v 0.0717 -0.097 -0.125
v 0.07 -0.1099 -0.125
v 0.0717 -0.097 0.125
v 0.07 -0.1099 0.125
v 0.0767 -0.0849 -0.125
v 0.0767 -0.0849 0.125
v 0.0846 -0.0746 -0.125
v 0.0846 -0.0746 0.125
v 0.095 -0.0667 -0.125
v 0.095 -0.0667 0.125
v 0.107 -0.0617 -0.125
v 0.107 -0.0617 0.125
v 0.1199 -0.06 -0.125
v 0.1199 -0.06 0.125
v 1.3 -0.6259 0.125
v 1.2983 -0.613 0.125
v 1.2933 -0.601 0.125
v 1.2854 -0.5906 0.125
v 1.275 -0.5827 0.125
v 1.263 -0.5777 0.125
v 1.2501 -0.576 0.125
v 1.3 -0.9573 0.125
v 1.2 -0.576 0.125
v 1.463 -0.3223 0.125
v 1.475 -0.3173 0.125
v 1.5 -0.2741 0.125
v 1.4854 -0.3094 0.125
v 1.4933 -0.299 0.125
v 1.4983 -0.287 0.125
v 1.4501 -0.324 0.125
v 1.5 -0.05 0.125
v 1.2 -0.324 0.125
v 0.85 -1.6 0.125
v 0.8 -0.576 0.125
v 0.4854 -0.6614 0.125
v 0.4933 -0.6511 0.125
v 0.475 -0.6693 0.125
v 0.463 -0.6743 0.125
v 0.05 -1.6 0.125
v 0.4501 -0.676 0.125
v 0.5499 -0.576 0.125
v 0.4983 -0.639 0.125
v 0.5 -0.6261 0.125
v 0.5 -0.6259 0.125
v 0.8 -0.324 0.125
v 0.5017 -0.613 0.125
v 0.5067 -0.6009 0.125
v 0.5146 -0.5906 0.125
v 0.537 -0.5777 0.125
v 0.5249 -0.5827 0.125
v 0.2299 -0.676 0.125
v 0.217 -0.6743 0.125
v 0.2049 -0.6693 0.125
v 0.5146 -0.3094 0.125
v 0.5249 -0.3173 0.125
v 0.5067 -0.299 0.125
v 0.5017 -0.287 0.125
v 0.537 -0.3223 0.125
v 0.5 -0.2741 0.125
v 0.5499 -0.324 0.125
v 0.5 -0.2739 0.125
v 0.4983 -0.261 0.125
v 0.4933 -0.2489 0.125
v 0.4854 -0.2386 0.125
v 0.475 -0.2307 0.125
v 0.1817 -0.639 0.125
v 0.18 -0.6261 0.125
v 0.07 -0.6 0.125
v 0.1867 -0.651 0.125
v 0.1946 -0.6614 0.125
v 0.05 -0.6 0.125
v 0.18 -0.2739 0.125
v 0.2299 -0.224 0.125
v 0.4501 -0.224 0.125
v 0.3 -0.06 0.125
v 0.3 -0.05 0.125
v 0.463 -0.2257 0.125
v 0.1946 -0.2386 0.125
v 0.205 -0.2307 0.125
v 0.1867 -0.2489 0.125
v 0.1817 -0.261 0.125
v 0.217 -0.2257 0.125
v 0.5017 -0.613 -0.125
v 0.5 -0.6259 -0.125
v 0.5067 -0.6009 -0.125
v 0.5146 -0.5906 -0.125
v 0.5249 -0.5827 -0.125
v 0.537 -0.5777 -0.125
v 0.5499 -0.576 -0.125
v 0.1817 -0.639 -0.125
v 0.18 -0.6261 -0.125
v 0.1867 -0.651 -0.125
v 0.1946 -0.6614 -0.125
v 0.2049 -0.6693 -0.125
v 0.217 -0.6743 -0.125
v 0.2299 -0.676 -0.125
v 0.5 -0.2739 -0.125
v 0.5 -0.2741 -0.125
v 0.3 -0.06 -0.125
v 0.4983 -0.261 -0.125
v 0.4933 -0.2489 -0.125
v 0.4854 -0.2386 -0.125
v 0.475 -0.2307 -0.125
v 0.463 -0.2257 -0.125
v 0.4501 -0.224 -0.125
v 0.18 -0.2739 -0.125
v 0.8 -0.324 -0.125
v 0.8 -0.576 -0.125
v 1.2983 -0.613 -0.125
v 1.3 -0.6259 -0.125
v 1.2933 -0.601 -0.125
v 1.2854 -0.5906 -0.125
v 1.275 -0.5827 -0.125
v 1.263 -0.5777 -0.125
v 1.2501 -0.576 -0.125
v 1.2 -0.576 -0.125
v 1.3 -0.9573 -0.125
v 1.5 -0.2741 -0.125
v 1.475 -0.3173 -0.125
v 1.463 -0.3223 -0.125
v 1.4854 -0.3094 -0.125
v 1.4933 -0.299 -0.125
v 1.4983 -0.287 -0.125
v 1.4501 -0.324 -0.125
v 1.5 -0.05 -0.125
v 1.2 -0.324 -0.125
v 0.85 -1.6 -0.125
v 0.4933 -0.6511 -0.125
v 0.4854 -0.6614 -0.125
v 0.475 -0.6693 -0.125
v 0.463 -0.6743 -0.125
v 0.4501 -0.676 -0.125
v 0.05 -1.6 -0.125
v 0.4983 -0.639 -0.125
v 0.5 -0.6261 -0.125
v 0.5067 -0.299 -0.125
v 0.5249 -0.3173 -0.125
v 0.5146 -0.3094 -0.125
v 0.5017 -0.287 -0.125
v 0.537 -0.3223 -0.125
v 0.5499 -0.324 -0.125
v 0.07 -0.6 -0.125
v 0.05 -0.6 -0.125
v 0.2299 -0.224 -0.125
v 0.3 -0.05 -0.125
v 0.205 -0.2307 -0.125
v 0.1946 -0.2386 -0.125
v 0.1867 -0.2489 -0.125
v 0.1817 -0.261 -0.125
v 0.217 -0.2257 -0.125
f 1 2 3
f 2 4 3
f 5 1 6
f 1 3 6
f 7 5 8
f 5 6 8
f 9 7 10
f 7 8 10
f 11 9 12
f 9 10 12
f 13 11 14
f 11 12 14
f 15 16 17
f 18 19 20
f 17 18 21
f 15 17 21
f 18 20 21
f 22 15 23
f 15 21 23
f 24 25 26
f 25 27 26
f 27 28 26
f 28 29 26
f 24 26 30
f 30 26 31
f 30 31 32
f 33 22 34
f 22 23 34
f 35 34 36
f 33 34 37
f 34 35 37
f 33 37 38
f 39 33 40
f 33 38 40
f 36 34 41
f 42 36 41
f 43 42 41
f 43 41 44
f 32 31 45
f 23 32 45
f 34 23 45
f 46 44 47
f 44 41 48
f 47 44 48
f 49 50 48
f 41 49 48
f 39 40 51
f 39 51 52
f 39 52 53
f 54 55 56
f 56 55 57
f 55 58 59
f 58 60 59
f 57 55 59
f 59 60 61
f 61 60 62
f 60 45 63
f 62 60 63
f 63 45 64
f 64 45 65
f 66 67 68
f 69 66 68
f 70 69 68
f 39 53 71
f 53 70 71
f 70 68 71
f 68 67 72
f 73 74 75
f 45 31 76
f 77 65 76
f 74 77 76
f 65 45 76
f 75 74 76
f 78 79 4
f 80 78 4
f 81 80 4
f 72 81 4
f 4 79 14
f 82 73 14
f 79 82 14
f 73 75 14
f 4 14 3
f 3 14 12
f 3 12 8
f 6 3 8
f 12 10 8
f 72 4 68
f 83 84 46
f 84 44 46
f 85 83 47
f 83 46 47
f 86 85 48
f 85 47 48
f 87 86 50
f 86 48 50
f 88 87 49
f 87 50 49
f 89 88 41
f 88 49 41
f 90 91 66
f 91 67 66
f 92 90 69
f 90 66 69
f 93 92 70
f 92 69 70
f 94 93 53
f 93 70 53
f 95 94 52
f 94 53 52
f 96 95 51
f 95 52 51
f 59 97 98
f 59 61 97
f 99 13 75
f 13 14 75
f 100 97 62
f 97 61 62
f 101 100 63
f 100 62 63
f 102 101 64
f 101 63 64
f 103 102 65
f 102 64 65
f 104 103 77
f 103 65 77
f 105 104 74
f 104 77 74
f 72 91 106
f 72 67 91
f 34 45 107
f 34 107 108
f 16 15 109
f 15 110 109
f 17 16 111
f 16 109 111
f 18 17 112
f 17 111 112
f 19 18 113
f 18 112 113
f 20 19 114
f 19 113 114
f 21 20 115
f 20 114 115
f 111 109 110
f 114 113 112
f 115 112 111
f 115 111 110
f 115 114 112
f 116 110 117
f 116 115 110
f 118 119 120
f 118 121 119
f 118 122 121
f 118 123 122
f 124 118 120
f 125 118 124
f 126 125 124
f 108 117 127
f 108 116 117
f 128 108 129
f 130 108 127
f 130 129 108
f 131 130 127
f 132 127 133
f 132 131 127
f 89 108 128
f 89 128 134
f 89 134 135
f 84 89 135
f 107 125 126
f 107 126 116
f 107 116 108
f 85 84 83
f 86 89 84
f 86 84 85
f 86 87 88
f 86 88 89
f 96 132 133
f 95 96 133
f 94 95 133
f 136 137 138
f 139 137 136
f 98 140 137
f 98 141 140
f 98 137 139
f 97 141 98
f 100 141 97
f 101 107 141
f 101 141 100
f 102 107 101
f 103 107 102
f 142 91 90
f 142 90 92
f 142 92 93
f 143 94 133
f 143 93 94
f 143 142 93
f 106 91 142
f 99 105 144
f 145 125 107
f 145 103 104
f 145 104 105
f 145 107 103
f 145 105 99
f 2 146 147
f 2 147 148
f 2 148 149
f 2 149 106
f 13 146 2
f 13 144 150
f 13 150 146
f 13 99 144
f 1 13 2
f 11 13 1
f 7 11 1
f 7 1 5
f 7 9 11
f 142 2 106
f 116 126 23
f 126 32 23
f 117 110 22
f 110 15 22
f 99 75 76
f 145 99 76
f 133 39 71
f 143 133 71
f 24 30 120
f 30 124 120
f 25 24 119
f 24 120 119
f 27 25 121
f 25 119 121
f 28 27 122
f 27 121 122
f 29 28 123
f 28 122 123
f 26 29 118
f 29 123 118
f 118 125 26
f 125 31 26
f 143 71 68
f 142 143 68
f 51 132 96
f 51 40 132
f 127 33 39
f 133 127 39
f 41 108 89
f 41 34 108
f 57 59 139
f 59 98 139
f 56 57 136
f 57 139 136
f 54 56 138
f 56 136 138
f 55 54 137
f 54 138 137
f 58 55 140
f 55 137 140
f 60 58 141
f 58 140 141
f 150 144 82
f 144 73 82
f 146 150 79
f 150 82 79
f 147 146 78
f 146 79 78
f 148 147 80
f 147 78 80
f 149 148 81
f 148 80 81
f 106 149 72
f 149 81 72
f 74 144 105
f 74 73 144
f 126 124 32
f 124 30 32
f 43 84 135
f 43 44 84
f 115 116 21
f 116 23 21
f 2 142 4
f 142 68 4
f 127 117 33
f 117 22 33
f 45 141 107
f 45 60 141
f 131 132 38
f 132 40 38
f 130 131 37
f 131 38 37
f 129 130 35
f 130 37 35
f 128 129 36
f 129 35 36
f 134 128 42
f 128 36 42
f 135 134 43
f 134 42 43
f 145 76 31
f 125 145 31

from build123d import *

# Parameters (mm, degrees)
BOSS_EXTRUDE1_DEPTH = 0.125
FILLET1_R           = 0.05


with BuildPart() as part:
    # frame_outline → Boss-Extrude1 (new, symmetric)
    with BuildSketch(Plane.XY):
        Polygon((0.3, -0.05), (1.5, -0.05), (1.5, -0.324), (1.2, -0.324), (1.2, -0.576), (1.3, -0.576), (1.3, -0.957333397), (0.85, -1.6), (0.05, -1.6), (0.05, -0.6), (0.07, -0.6), (0.07, -0.06), (0.3, -0.06), align=None)
        Polygon((0.5, -0.324), (0.8, -0.324), (0.8, -0.576), (0.5, -0.576), (0.5, -0.676), (0.18, -0.676), (0.18, -0.224), (0.5, -0.224), align=None, mode=Mode.SUBTRACT)
    extrude(amount=BOSS_EXTRUDE1_DEPTH, both=True)

    # Fillet1
    fillet1_edges = [part.edges().sort_by_distance(p)[0] for p in [
        (1.3, -0.576, 0),
        (1.5, -0.324, 0),
        (0.5, -0.324, 0),
        (0.5, -0.576, 0),
        (0.5, -0.676, 0),
        (0.18, -0.676, 0),
        (0.5, -0.224, 0),
        (0.18, -0.224, 0),
        (0.07, -0.06, 0),
    ]]
    fillet(fillet1_edges, radius=FILLET1_R - 0.0001)  # a hair under: the kernel refuses the full size


solid = part.part
